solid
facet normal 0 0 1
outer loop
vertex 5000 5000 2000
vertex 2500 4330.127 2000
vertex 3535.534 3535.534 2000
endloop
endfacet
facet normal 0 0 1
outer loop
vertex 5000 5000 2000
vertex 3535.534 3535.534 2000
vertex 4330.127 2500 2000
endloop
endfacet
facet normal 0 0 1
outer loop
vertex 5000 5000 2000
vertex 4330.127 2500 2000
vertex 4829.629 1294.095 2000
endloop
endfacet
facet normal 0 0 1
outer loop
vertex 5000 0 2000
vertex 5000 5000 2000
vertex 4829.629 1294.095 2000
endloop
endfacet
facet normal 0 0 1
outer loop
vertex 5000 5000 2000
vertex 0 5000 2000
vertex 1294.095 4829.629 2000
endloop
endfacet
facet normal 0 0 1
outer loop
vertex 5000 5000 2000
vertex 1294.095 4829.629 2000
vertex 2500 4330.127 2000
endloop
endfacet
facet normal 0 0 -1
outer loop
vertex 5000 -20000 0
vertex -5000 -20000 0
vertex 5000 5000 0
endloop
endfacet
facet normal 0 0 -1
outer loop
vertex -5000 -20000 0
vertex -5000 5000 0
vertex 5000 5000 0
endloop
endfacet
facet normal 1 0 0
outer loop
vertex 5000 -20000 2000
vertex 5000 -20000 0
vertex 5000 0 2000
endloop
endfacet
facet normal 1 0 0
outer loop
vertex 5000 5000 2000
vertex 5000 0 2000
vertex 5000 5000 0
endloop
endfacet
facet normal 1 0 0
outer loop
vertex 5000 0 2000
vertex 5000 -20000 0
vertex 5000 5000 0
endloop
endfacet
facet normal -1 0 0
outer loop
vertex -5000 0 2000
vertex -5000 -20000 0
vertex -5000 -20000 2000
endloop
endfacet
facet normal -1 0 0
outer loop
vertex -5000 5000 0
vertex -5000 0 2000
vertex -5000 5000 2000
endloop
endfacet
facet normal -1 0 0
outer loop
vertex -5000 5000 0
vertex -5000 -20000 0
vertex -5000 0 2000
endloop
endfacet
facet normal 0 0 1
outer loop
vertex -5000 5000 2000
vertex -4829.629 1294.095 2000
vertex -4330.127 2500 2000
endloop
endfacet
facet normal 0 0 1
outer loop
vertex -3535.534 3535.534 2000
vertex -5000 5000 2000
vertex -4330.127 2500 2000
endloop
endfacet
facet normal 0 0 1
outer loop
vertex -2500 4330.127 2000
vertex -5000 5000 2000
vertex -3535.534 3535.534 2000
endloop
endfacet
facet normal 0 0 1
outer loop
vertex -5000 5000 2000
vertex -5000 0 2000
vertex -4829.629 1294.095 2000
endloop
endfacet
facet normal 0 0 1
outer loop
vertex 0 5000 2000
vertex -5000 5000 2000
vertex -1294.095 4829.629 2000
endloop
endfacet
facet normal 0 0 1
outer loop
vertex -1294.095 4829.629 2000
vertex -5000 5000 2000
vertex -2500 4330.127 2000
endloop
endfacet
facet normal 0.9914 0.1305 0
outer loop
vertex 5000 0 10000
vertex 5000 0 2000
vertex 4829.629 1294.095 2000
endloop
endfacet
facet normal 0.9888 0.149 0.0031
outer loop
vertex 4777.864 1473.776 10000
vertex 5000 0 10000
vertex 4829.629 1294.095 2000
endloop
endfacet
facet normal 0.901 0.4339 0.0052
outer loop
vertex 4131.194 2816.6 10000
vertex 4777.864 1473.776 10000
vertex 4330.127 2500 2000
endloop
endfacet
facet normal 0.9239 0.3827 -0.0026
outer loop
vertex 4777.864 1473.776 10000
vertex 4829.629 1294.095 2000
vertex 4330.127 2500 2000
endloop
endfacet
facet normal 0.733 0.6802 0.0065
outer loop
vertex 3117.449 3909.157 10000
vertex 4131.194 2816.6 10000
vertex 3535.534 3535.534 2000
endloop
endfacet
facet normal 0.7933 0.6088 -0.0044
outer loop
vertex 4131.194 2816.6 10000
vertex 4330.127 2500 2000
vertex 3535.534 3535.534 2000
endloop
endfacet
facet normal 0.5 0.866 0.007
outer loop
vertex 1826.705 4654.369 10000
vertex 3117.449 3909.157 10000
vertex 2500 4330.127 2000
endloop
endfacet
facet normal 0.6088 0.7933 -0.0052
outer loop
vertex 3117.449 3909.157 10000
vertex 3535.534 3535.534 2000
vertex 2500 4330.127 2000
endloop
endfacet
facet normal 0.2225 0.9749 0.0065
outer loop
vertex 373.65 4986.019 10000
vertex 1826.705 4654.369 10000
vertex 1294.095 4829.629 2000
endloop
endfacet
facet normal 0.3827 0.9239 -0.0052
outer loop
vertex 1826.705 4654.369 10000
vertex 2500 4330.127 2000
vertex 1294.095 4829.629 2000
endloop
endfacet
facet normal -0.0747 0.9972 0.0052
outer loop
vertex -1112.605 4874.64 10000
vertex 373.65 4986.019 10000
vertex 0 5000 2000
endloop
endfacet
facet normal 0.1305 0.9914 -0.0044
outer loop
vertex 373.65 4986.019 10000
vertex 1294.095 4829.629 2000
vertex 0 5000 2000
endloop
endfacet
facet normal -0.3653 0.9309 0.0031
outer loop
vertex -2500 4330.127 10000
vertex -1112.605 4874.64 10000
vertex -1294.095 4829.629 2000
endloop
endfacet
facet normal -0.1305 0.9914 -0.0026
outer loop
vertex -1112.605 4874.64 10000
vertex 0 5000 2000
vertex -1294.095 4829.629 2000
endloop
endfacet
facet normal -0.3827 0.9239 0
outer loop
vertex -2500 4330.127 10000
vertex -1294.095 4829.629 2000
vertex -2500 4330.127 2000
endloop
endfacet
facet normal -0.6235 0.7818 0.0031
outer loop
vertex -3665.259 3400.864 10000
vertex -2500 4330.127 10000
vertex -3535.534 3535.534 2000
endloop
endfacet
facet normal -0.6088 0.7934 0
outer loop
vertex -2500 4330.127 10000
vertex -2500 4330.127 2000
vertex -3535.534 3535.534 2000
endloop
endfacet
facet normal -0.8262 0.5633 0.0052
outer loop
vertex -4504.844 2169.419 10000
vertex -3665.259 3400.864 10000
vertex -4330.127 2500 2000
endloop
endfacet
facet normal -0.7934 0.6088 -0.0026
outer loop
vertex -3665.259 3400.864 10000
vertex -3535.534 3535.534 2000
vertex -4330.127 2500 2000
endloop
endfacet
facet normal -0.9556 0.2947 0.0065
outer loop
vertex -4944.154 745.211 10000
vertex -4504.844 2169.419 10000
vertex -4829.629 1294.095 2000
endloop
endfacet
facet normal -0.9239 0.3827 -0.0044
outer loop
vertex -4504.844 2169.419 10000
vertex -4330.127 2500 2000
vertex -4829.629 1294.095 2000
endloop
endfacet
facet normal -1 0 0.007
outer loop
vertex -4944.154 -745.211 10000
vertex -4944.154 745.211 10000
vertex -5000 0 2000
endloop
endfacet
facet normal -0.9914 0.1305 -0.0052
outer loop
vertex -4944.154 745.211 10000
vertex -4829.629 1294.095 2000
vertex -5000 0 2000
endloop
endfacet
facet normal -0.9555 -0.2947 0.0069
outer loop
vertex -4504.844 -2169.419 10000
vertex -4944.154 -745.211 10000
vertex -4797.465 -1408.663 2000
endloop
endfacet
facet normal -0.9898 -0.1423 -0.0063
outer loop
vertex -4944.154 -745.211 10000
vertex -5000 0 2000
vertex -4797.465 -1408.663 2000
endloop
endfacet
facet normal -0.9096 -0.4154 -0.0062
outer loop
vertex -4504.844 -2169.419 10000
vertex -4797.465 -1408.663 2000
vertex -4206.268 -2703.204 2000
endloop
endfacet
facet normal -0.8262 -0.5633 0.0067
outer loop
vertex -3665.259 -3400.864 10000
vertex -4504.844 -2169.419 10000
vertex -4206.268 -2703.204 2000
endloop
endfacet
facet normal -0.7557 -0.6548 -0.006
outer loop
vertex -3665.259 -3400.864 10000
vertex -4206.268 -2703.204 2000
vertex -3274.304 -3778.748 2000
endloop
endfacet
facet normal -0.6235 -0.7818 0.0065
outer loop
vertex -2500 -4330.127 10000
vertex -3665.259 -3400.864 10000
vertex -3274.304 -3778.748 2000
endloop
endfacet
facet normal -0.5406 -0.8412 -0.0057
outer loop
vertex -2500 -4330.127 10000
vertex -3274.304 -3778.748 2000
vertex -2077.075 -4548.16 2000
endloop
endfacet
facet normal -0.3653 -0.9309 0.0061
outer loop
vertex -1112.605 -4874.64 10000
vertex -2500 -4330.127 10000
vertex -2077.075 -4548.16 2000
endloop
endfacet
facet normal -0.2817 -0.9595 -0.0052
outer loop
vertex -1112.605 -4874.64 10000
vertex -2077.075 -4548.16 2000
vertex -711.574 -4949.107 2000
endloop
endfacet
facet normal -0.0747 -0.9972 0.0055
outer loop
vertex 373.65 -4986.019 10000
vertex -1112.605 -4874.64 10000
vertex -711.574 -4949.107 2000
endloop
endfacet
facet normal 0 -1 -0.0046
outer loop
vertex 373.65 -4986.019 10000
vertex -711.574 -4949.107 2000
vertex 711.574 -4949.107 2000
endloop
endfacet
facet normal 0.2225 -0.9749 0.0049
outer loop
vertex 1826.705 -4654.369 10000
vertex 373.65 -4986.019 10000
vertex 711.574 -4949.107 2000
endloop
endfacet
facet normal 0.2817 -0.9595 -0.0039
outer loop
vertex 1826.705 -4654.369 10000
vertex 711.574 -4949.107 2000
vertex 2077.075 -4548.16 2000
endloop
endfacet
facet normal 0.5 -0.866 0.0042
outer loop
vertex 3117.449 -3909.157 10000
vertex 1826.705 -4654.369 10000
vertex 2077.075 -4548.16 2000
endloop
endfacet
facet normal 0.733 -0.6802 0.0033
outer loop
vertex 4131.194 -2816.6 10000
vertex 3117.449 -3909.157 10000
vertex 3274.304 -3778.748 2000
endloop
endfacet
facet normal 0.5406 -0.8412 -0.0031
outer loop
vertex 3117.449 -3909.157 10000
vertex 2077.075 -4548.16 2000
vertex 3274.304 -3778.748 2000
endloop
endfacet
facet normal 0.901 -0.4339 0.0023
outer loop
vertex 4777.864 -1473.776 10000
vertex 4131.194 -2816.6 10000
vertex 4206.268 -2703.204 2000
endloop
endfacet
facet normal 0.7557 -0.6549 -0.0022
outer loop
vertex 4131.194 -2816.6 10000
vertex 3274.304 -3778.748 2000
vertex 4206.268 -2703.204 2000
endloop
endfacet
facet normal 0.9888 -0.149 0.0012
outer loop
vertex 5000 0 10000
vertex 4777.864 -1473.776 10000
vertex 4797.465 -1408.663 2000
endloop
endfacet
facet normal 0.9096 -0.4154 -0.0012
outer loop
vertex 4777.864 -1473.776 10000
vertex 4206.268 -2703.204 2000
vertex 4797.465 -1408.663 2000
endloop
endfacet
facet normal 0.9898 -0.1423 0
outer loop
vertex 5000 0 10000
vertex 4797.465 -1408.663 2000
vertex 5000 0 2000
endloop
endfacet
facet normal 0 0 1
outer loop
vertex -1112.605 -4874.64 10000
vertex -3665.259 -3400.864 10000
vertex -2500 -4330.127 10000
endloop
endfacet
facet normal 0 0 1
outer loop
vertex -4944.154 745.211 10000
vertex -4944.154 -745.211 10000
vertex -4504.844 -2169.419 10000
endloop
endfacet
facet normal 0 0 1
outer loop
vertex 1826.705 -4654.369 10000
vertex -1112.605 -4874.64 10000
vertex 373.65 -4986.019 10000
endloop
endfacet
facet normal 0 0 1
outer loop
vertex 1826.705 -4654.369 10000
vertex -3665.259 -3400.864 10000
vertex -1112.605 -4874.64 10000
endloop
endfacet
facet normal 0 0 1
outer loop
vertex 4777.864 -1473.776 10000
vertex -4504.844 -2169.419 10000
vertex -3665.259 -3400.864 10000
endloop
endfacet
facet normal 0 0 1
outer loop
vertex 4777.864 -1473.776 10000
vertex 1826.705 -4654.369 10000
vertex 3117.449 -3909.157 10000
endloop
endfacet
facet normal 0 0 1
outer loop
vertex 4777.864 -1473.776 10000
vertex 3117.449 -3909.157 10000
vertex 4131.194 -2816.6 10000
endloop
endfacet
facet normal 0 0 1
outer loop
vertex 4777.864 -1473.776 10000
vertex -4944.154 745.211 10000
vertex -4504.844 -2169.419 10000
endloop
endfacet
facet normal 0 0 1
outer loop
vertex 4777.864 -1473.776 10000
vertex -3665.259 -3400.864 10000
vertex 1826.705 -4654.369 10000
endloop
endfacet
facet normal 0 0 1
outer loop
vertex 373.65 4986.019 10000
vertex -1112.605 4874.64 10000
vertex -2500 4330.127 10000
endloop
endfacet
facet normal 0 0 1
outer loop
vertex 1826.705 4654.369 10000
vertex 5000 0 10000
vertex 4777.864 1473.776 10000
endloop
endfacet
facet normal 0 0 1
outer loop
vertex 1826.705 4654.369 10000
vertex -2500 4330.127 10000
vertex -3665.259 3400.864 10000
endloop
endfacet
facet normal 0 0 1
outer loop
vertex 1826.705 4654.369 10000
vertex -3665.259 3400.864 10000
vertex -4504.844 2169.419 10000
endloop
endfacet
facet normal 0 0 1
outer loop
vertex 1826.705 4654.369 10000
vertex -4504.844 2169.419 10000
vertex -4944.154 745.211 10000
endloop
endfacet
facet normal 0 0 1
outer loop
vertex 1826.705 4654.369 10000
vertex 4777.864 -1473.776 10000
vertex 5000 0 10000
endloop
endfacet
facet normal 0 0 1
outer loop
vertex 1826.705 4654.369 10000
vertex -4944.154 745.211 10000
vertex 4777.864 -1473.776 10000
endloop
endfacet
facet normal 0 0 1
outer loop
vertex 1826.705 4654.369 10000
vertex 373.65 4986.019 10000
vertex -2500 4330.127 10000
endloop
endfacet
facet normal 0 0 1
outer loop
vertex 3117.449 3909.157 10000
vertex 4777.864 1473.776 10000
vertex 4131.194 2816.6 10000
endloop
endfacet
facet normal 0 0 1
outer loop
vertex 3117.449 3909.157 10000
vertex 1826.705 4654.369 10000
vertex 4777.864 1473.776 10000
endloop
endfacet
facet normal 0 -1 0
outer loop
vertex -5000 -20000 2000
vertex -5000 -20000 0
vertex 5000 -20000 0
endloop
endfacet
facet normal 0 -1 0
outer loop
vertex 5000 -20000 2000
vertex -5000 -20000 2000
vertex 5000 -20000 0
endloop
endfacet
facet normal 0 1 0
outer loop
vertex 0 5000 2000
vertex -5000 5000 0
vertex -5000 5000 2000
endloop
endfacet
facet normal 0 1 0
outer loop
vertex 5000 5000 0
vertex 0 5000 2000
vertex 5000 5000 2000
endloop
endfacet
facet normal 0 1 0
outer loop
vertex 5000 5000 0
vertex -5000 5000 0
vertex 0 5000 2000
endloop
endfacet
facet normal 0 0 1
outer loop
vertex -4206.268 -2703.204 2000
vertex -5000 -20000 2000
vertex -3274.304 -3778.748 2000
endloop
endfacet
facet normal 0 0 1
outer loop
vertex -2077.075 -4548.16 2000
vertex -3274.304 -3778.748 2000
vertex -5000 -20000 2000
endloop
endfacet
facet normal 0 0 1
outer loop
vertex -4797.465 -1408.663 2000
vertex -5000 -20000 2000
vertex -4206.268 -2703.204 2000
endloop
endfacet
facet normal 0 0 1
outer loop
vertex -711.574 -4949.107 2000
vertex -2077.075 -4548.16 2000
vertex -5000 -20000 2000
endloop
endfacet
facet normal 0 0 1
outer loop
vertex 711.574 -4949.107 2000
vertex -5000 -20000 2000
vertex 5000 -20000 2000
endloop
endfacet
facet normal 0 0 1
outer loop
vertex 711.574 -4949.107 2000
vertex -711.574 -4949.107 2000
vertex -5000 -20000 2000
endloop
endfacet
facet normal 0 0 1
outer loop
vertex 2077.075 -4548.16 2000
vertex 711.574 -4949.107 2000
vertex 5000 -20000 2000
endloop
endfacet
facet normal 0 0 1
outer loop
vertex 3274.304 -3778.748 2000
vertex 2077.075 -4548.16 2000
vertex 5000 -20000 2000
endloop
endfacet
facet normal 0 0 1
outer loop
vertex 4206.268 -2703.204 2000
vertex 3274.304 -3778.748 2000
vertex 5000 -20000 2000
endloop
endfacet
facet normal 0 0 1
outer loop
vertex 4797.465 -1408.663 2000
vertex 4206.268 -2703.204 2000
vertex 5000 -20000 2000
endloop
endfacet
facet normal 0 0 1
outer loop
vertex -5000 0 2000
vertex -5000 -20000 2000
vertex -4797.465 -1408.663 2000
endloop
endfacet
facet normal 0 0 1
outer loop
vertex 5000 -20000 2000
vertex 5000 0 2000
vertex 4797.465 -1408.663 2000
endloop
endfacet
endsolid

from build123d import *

# Parameters (mm, degrees)
SKETCH1_R           = 5000
BOSS_EXTRUDE4_DEPTH = 10000
SKETCH1_5_W         = 10000
SKETCH1_5_H         = 25000
BOSS_EXTRUDE5_DEPTH = 2000


with BuildPart() as part:
    # Sketch1 → Boss-Extrude4 (new body)
    with BuildSketch(Plane.XY):
        Circle(SKETCH1_R)
    extrude(amount=BOSS_EXTRUDE4_DEPTH)

    # Sketch1<5> → Boss-Extrude5 (add)
    with BuildSketch(Plane.XY):
        with Locations((0, -7500)):
            Rectangle(SKETCH1_5_W, SKETCH1_5_H)
    extrude(amount=BOSS_EXTRUDE5_DEPTH)


solid = part.part
